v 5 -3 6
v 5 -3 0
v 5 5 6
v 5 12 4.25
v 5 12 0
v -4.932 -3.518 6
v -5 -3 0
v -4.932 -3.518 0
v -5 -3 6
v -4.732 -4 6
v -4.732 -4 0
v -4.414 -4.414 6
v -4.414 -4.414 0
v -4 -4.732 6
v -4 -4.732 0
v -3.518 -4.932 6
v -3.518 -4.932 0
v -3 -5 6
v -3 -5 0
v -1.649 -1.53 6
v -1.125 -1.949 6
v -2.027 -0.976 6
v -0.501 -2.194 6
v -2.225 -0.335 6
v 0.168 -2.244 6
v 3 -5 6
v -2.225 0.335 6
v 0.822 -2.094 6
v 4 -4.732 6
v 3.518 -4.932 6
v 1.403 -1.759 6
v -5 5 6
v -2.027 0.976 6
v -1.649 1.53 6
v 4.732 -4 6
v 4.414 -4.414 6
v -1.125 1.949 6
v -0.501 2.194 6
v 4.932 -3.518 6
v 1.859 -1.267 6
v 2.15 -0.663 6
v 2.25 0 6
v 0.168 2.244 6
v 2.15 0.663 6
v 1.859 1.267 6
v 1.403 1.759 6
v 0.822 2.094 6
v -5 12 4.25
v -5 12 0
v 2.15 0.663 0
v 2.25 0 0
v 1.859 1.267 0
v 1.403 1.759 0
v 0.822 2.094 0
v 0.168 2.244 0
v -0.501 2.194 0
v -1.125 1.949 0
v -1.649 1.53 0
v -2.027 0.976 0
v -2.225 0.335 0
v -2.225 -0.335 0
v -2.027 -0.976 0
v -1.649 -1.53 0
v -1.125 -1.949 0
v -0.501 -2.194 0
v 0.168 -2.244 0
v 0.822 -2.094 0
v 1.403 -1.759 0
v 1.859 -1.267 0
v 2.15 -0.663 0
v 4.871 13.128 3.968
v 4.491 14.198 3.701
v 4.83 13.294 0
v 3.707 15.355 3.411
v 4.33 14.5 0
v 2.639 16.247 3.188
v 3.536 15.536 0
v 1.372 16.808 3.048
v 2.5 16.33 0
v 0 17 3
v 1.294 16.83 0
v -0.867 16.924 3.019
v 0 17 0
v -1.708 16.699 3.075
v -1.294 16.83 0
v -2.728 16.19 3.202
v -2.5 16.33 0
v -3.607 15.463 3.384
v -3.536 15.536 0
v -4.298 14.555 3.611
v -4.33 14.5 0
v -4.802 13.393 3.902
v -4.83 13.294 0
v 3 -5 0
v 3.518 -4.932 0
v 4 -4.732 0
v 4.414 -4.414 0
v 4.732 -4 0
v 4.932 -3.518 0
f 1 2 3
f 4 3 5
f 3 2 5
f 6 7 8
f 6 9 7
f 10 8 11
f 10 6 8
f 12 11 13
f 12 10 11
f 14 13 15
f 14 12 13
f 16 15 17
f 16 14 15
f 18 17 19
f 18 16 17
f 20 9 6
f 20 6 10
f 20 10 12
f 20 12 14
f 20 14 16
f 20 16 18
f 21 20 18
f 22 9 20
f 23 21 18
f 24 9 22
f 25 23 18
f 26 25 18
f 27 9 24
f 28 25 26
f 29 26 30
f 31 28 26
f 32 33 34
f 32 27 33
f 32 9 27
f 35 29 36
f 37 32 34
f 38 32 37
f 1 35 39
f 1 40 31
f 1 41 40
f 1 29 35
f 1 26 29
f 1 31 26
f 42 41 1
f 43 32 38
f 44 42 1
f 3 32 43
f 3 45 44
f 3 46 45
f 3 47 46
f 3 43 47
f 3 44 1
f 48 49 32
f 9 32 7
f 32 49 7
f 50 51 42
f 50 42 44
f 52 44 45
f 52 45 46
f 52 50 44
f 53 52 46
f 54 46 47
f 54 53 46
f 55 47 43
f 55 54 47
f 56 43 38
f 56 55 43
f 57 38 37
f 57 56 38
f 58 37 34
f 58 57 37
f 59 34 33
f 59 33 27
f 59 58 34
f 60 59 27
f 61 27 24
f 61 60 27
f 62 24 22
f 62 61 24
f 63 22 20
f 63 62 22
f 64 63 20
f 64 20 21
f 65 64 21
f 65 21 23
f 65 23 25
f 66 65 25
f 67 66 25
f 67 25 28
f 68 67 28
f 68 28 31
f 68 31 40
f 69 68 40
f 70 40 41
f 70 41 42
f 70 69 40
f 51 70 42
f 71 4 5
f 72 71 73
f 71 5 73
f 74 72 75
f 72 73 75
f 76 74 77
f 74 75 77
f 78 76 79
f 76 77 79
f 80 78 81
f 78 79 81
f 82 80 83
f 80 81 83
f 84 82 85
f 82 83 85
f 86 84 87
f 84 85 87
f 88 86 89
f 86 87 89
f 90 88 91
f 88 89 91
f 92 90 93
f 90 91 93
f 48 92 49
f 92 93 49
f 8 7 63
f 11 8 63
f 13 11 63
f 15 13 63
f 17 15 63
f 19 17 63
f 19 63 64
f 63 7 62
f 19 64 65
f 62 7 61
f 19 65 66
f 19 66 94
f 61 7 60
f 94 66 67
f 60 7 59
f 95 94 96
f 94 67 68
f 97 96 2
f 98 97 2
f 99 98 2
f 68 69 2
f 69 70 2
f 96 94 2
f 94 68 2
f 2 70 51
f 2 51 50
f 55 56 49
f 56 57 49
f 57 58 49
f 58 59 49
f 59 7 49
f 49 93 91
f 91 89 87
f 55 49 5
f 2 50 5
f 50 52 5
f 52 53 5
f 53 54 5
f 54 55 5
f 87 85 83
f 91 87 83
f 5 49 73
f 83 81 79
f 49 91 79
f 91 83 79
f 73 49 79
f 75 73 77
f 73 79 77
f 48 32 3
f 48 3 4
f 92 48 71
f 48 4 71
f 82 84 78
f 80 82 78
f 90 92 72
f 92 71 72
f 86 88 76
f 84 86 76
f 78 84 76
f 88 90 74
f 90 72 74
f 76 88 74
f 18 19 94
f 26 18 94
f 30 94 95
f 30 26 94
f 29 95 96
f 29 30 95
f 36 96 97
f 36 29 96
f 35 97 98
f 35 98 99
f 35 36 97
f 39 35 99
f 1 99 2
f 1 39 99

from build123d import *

# Parameters (mm, degrees)
SKETCH1_R           = 2.25
BOSS_EXTRUDE1_DEPTH = 6
CUT_EXTRUDE1_DEPTH  = 11
FILLET1_R           = 2


with BuildPart() as part:
    # Sketch1 → Boss-Extrude1 (new body)
    with BuildSketch(Plane.XY):
        with BuildLine():
            Line((-5, 12), (-5, -5))
            Line((-5, -5), (5, -5))
            Line((5, -5), (5, 12))
            ThreePointArc((5, 12), (0, 17), (-5, 12))
        make_face()
        Circle(SKETCH1_R, mode=Mode.SUBTRACT)
    extrude(amount=BOSS_EXTRUDE1_DEPTH)

    # Sketch2 → Cut-Extrude1 (cut, through all)
    with BuildSketch(Plane(origin=(5, 0, 0), x_dir=(0, 0, -1), z_dir=(1, 0, 0))):
        Polygon((-6, 5), (-3, 17), (-6, 17), align=None)
    extrude(amount=-CUT_EXTRUDE1_DEPTH, mode=Mode.SUBTRACT)

    # Fillet1
    fillet1_edges = [part.edges().sort_by_distance(p)[0] for p in [
        (5, -5, 3),
        (-5, -5, 3),
    ]]
    fillet(fillet1_edges, radius=FILLET1_R)


solid = part.part
